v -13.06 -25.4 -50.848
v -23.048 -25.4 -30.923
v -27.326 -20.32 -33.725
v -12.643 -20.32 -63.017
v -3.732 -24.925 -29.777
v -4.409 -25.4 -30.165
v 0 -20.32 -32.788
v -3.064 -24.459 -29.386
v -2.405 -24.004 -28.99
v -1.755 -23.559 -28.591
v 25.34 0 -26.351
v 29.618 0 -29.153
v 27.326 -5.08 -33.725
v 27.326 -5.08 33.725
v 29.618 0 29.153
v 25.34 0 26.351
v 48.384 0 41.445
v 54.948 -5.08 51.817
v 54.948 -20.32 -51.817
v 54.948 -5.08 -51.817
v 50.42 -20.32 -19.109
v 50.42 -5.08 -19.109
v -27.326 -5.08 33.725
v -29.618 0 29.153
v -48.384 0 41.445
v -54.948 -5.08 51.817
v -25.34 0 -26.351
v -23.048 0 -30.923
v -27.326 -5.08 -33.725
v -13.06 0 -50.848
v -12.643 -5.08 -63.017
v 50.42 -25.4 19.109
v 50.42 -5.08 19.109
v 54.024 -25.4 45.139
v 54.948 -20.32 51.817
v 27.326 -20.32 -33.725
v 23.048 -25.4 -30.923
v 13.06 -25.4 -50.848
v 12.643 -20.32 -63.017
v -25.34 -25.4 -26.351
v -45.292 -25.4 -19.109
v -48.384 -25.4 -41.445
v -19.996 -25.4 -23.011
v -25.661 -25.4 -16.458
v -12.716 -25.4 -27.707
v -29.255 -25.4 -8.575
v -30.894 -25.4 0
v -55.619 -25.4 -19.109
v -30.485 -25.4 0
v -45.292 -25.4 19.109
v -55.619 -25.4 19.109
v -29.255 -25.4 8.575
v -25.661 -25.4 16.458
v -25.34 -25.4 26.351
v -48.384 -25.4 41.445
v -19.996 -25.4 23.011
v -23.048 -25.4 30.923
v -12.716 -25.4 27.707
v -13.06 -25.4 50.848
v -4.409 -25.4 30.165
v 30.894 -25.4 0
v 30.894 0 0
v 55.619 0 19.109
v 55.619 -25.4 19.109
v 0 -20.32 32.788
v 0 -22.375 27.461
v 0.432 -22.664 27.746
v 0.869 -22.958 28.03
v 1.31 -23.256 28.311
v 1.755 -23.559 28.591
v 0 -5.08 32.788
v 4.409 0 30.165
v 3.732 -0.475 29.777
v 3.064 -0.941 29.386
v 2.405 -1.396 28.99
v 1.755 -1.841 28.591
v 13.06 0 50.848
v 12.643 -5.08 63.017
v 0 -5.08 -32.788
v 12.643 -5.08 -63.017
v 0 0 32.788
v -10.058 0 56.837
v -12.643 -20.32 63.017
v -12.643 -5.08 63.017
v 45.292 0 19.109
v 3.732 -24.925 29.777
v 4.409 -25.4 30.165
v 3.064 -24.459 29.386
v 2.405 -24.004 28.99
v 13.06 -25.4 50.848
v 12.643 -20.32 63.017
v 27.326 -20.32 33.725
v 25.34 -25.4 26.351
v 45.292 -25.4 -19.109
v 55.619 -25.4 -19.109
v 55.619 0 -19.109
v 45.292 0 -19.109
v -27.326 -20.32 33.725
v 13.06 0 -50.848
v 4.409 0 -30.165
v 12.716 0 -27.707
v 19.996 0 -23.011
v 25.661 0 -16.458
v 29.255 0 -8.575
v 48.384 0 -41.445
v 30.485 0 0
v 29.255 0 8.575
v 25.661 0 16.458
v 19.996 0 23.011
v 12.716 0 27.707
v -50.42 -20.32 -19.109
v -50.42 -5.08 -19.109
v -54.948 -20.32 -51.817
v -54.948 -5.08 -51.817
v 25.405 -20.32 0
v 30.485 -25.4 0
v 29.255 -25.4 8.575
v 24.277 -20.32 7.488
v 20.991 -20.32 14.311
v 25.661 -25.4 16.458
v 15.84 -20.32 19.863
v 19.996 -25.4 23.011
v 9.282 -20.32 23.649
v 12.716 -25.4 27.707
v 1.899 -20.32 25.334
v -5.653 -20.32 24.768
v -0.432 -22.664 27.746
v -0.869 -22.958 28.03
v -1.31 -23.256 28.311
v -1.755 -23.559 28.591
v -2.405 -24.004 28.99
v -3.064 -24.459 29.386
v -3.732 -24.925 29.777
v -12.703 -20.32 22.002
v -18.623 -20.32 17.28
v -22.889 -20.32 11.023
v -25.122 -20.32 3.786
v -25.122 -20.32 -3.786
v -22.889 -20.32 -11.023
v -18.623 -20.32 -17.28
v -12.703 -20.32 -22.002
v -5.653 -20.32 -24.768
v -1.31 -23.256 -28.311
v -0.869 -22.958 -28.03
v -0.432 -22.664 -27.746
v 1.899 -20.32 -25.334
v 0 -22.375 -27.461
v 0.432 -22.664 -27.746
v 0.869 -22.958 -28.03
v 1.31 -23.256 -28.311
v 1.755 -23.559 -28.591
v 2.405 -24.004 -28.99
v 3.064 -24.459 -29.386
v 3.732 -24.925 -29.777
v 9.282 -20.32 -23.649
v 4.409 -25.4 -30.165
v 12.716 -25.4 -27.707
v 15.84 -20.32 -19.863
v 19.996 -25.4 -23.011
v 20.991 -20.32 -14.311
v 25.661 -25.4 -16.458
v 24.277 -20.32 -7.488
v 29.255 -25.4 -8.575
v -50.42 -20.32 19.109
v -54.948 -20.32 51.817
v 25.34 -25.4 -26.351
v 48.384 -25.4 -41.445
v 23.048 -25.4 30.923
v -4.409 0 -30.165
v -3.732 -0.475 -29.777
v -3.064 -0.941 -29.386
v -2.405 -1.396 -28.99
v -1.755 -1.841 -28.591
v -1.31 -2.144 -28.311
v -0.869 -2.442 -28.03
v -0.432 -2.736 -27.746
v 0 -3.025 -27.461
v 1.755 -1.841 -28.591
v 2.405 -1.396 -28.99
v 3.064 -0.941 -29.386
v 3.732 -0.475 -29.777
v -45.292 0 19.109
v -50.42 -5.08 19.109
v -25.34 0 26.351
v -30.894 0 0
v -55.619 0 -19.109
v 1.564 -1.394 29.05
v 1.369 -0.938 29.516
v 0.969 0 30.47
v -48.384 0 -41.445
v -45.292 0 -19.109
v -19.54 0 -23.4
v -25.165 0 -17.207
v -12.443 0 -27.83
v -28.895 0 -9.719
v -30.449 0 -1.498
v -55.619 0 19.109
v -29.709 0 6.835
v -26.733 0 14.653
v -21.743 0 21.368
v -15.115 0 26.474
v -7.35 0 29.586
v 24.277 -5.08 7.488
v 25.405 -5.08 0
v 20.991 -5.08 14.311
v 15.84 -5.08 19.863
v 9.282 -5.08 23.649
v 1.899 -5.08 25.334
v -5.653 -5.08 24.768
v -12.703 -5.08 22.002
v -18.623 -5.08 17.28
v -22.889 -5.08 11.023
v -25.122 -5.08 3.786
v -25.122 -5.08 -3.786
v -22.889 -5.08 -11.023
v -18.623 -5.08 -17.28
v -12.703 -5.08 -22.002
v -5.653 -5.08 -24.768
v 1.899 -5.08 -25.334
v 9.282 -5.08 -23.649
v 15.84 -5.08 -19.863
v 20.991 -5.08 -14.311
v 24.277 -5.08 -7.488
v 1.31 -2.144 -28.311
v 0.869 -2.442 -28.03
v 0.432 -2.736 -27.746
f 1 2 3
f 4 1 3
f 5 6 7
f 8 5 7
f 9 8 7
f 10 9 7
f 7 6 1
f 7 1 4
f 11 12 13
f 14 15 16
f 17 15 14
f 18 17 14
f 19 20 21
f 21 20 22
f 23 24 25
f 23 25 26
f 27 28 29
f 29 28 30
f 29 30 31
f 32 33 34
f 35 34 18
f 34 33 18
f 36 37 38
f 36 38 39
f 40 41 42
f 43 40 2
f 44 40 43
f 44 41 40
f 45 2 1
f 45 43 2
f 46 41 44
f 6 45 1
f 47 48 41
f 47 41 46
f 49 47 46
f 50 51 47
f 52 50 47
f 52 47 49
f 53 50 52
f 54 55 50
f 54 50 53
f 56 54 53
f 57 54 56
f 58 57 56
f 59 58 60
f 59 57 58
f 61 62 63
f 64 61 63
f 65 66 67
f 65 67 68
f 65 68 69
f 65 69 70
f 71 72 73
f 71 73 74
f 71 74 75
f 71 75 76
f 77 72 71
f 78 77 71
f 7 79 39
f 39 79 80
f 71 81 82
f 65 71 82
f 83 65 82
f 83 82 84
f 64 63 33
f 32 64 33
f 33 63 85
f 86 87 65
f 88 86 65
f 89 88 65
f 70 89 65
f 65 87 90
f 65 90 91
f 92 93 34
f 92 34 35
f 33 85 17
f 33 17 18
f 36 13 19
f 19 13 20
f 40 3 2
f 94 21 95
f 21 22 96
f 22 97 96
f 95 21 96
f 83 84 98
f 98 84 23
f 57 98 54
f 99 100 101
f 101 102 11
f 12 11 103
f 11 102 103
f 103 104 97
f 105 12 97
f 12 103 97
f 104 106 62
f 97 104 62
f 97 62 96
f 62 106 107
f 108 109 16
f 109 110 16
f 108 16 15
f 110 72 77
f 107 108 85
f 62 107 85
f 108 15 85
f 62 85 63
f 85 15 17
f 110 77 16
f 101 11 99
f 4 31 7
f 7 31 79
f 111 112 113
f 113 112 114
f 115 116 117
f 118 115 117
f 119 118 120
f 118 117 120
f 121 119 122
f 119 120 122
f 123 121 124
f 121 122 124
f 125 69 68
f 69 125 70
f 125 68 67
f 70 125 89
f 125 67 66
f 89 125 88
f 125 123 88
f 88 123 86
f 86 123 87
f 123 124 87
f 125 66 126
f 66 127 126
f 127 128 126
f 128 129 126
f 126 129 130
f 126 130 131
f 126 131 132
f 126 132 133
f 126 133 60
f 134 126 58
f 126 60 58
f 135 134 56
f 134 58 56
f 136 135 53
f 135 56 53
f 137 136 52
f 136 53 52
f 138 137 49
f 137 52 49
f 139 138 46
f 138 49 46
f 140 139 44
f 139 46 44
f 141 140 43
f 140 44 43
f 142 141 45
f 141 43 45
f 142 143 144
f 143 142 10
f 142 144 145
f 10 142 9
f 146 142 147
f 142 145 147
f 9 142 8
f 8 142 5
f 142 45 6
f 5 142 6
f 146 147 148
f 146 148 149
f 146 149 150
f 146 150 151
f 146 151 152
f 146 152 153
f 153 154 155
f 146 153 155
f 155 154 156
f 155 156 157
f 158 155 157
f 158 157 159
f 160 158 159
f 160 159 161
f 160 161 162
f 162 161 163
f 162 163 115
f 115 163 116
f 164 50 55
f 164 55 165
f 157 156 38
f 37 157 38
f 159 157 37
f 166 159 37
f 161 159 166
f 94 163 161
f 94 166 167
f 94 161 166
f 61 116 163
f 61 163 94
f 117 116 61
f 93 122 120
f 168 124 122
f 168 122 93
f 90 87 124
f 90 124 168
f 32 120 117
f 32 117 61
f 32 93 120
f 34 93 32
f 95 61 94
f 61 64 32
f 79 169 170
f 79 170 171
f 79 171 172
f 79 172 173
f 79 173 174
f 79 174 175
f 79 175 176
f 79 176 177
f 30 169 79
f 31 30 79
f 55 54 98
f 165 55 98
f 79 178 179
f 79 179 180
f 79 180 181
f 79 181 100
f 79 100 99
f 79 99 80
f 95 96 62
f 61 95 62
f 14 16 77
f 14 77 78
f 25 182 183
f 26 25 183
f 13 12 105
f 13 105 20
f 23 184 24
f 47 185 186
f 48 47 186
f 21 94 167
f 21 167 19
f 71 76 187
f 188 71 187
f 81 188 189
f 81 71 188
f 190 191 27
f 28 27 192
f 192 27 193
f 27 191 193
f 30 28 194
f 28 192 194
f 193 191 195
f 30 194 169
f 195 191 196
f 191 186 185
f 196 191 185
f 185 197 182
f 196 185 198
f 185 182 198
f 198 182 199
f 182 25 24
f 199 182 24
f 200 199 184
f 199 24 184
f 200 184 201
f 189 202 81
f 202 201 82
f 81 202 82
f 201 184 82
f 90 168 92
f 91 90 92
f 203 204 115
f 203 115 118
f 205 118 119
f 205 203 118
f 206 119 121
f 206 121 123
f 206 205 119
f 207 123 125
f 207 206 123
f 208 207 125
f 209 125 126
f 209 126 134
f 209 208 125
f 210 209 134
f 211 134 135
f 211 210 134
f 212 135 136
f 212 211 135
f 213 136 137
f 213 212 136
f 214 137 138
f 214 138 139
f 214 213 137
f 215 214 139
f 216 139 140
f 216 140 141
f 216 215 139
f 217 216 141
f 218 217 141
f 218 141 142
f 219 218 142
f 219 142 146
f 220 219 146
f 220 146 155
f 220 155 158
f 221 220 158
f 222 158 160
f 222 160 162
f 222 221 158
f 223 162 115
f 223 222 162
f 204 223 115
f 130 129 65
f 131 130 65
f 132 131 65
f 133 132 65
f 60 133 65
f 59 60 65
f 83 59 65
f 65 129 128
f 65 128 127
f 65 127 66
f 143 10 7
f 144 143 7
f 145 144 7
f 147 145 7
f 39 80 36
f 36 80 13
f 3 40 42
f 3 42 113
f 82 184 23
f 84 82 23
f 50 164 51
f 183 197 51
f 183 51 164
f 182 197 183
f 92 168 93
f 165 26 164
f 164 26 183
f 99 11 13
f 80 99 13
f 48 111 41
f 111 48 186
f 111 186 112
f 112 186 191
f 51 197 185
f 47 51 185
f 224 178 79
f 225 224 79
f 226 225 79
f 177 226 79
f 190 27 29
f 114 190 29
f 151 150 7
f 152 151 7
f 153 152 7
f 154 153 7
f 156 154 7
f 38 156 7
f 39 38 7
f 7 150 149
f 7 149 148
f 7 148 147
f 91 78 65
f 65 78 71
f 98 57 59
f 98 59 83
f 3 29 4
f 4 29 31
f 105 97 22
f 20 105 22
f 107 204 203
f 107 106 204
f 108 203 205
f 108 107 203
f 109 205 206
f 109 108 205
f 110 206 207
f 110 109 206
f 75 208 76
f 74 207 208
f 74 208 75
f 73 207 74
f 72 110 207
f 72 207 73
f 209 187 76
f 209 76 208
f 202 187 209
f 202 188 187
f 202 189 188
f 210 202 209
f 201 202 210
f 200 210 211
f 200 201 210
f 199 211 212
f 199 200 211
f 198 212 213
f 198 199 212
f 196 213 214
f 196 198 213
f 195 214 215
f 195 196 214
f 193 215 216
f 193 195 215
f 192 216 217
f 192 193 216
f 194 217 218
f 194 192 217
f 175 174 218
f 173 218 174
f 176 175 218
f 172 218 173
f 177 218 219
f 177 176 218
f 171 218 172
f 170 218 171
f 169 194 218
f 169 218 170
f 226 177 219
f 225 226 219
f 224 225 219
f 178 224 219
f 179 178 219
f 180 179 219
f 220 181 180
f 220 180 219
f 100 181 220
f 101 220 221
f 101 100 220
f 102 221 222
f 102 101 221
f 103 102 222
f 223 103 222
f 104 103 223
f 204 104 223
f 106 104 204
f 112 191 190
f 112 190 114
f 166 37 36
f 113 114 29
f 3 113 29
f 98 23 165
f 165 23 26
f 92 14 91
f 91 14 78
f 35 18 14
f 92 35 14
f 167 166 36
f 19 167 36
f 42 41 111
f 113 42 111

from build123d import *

# Parameters (mm, degrees)
F0_R          = 25.4053922475
F1_DEPTH      = 25.4
F2_SIZE       = 5.08
F3_T4_DEPTH   = 58.8942991577
F3_T9_DEPTH   = 59.1482991577
F3_T14_DEPTH  = 59.1482991577
F3_T19_DEPTH  = 59.1482991577
F3_T24_DEPTH  = 59.1482991577
F3_T29_DEPTH  = 58.8942991577
F3_T34_DEPTH  = 58.8942991577
F3_T39_DEPTH  = 58.8942991577
F3_T44_DEPTH  = 58.8942991577
F3_T49_DEPTH  = 59.1482991577
F3_T54_DEPTH  = 59.1482991577
F3_T59_DEPTH  = 58.8942991577
F3_T64_DEPTH  = 58.8942991577
F3_T69_DEPTH  = 59.1482991577
F3_T74_DEPTH  = 59.1482991577
F3_T79_DEPTH  = 59.1482991577
F3_T84_DEPTH  = 59.1482991577
F3_T89_DEPTH  = 58.8942991577
F3_T94_DEPTH  = 58.8942991577
F3_T99_DEPTH  = 58.8942991577
F3_T104_DEPTH = 59.1482991577
F3_T109_DEPTH = 59.1482991577
F3_T114_DEPTH = 59.1482991577
F3_T119_DEPTH = 58.8942991577
F3_T124_DEPTH = 59.1482991577
F3_T129_DEPTH = 59.1482991577
F3_T134_DEPTH = 58.8942991577
F3_T139_DEPTH = 58.8942991577
F3_T144_DEPTH = 58.8942991577
F3_T149_DEPTH = 58.8942991577


# Not quite as in the source:
# - a fillet or chamfer that OpenCascade refuses, or shapes differently, is made with other operations: its cross-section is extruded or revolved along the edge and cut away or added


with BuildPart() as f1:
    # F0 (on Front) → F1 (new body)
    with BuildSketch(Plane.XZ):
        Polygon((-55.6186027825, 19.1091839224), (-30.8941560641, 0), (-50.4200380058, 19.1091839224), align=None)
        Polygon((-54.9483810148, 51.8172029635), (-50.4200380058, 19.1091839224), (-27.3260947604, 33.7249476569), align=None)
        Polygon((-12.64267964, 63.0167225502), (-27.3260947604, 33.7249476569), (0, 32.7880373733), align=None)
        Polygon((12.64267964, 63.0167225502), (0, 32.7880373733), (27.3260947604, 33.7249476569), align=None)
        Polygon((54.9483810148, 51.8172029635), (27.3260947604, 33.7249476569), (50.4200380058, 19.1091839224), align=None)
        Polygon((55.6186027825, 19.1091839224), (50.4200380058, 19.1091839224), (30.8941560641, 0), align=None)
        Polygon((0, -32.7880373733), (-27.3260947604, -33.7249476569), (-12.64267964, -63.0167225502), align=None)
        Polygon((-27.3260947604, -33.7249476569), (-50.4200380058, -19.1091839224), (-54.9483810148, -51.8172029635), align=None)
        Polygon((-50.4200380058, -19.1091839224), (-30.8941560641, 0), (-55.6186027825, -19.1091839224), align=None)
        Polygon((27.3260947604, -33.7249476569), (0, -32.7880373733), (12.64267964, -63.0167225502), align=None)
        Polygon((50.4200380058, -19.1091839224), (27.3260947604, -33.7249476569), (54.9483810148, -51.8172029635), align=None)
        Polygon((30.8941560641, 0), (50.4200380058, -19.1091839224), (55.6186027825, -19.1091839224), align=None)
        Polygon((-50.4200380058, 19.1091839224), (-30.8941560641, 0), (-50.4200380058, -19.1091839224), (-27.3260947604, -33.7249476569), (0, -32.7880373733), (27.3260947604, -33.7249476569), (50.4200380058, -19.1091839224), (30.8941560641, 0), (50.4200380058, 19.1091839224), (27.3260947604, 33.7249476569), (0, 32.7880373733), (-27.3260947604, 33.7249476569), align=None)
        Circle(F0_R, mode=Mode.SUBTRACT)
    extrude(amount=F1_DEPTH)

    # F2
    f2_edges = [f1.edges().sort_by_distance(p)[0] for p in [
        (-25.405392, 0, 0),
        (-25.405392, -25.4, 0),
    ]]
    chamfer(f2_edges, length=F2_SIZE)

    # F3: chamfer of 5.08 on 30 edges, made by hand


with BuildPart() as f3_tool2:
    # F3_s3 → F3_t4 (new body)
    with BuildSketch(Plane(origin=(28.5608965027, 0, 56.9758018995), x_dir=(0, 1, 0), z_dir=(-0.4481296197, 0, -0.8939685922))):
        Polygon((0, -34.4618184336), (-5.08, -39.5418184336), (0, -39.5418184336), align=None)
    extrude(amount=F3_T4_DEPTH)

    split(bisect_by=Plane(origin=(2.2353786575, 4.079767946, 3.4128563917), x_dir=(-0.8769857612, 0.4805163626, 0), z_dir=(0.3874365964, 0.7071067812, 0.5915174416)), keep=Keep.TOP)


with BuildPart() as f1_1:
    add(f1.part)

    # F3_t1: cut F3_tool2
    add(f3_tool2.part, mode=Mode.SUBTRACT)


with BuildPart() as f3_tool7:
    # F3_s8 → F3_t9 (new body)
    with BuildSketch(Plane(origin=(-23.6516969458, 0, 15.4915684979), x_dir=(0, 1, 0), z_dir=(-0.8365319883, 0, 0.5479180892))):
        Polygon((0, -8.159535892), (-5.08, -13.239535892), (0, -13.239535892), align=None)
    extrude(amount=F3_T9_DEPTH)

    split(bisect_by=Plane(origin=(-15.4038916556, 17.2309092168, 7.7216807951), x_dir=(-0.7455258584, -0.6664767021, 0), z_dir=(-0.6321312537, 0.7071067812, 0.316875493)), keep=Keep.TOP)


with BuildPart() as f1_2:
    add(f1_1.part)

    # F3_t6: cut F3_tool7
    add(f3_tool7.part, mode=Mode.SUBTRACT)


with BuildPart() as f3_tool12:
    # F3_s13 → F3_t14 (new body)
    with BuildSketch(Plane(origin=(-9.8640749157, 0, 71.247771982), x_dir=(0, 1, 0), z_dir=(0.1371394006, 0, -0.9905517578))):
        Polygon((0, -42.2430352429), (-5.08, -47.3230352429), (0, -47.3230352429), align=None)
    extrude(amount=F3_T14_DEPTH)

    split(bisect_by=Plane.XY.offset(19.1091839224), keep=Keep.TOP)


with BuildPart() as f1_3:
    add(f1_2.part)

    # F3_t11: cut F3_tool12
    add(f3_tool12.part, mode=Mode.SUBTRACT)


with BuildPart() as f3_tool17:
    # F3_s18 → F3_t19 (new body)
    with BuildSketch(Plane(origin=(-1.7525126205, 0, -12.658320283), x_dir=(0, 1, 0), z_dir=(-0.1371394006, 0, -0.9905517578))):
        Polygon((0, -42.2430352429), (-5.08, -47.3230352429), (0, -47.3230352429), align=None)
    extrude(amount=F3_T19_DEPTH)

    split(bisect_by=Plane.XY.offset(-19.1091839224), keep=Keep.BOTTOM)


with BuildPart() as f1_4:
    add(f1_3.part)

    # F3_t16: cut F3_tool17
    add(f3_tool17.part, mode=Mode.SUBTRACT)


with BuildPart() as f3_tool22:
    # F3_s23 → F3_t24 (new body)
    with BuildSketch(Plane(origin=(-73.1311412461, 0, -47.8999915541), x_dir=(0, 1, 0), z_dir=(0.8365319883, 0, 0.5479180892))):
        Polygon((0, -8.159535892), (-5.08, -13.239535892), (0, -13.239535892), align=None)
    extrude(amount=F3_T24_DEPTH)

    split(bisect_by=Plane(origin=(-15.4038916556, 17.2309092168, -7.7216807951), x_dir=(-0.7455258584, -0.6664767021, 0), z_dir=(-0.6321312537, 0.7071067812, -0.316875493)), keep=Keep.TOP)


with BuildPart() as f1_5:
    add(f1_4.part)

    # F3_t21: cut F3_tool22
    add(f3_tool22.part, mode=Mode.SUBTRACT)


with BuildPart() as f3_tool27:
    # F3_s28 → F3_t29 (new body)
    with BuildSketch(Plane(origin=(2.1686166163, 0, -4.3261481905), x_dir=(0, 1, 0), z_dir=(0.4481296197, 0, -0.8939685922))):
        Polygon((0, -34.4618184336), (-5.08, -39.5418184336), (0, -39.5418184336), align=None)
    extrude(amount=F3_T29_DEPTH)

    split(bisect_by=Plane(origin=(2.2353786575, 4.079767946, -3.4128563917), x_dir=(-0.8769857612, 0.4805163626, 0), z_dir=(0.3874365964, 0.7071067812, -0.5915174416)), keep=Keep.TOP)


with BuildPart() as f1_6:
    add(f1_5.part)

    # F3_t26: cut F3_tool27
    add(f3_tool27.part, mode=Mode.SUBTRACT)


with BuildPart() as f3_tool32:
    # F3_s33 → F3_t34 (new body)
    with BuildSketch(Plane(origin=(-29.3549569097, 0, -70.1877905691), x_dir=(0, 1, 0), z_dir=(0.3858475139, 0, 0.9225625703))):
        Polygon((0, -7.5711827057), (-5.08, -12.6511827057), (0, -12.6511827057), align=None)
    extrude(amount=F3_T34_DEPTH)

    split(bisect_by=Plane(origin=(-3.4924448884, 3.7855913528, -1.4606610121), x_dir=(-0.7349918349, -0.6780759564, 0), z_dir=(-0.6523502495, 0.7071067812, -0.2728353936)), keep=Keep.TOP)


with BuildPart() as f1_7:
    add(f1_6.part)

    # F3_t31: cut F3_tool32
    add(f3_tool32.part, mode=Mode.SUBTRACT)


with BuildPart() as f3_tool37:
    # F3_s38 → F3_t39 (new body)
    with BuildSketch(Plane(origin=(6.6307379976, 0, -15.854114565), x_dir=(0, 1, 0), z_dir=(0.3858475139, 0, -0.9225625703))):
        Polygon((0, -7.5711827057), (-5.08, -12.6511827057), (0, -12.6511827057), align=None)
    extrude(amount=F3_T39_DEPTH)

    split(bisect_by=Plane(origin=(3.4924448884, 3.7855913528, -1.4606610121), x_dir=(-0.7349918349, 0.6780759564, 0), z_dir=(0.6523502495, 0.7071067812, -0.2728353936)), keep=Keep.TOP)


with BuildPart() as f1_8:
    add(f1_7.part)

    # F3_t36: cut F3_tool37
    add(f3_tool37.part, mode=Mode.SUBTRACT)


with BuildPart() as f3_tool42:
    # F3_s43 → F3_t44 (new body)
    with BuildSketch(Plane(origin=(-28.5608965027, 0, -56.9758018995), x_dir=(0, 1, 0), z_dir=(0.4481296197, 0, 0.8939685922))):
        Polygon((0, -34.4618184336), (-5.08, -39.5418184336), (0, -39.5418184336), align=None)
    extrude(amount=F3_T44_DEPTH)

    split(bisect_by=Plane(origin=(-2.2353786575, 4.079767946, -3.4128563917), x_dir=(-0.8769857612, -0.4805163626, 0), z_dir=(-0.3874365964, 0.7071067812, -0.5915174416)), keep=Keep.TOP)


with BuildPart() as f1_9:
    add(f1_8.part)

    # F3_t41: cut F3_tool42
    add(f3_tool42.part, mode=Mode.SUBTRACT)


with BuildPart() as f3_tool47:
    # F3_s48 → F3_t49 (new body)
    with BuildSketch(Plane(origin=(23.6516969458, 0, -15.4915684979), x_dir=(0, 1, 0), z_dir=(0.8365319883, 0, -0.5479180892))):
        Polygon((0, -8.159535892), (-5.08, -13.239535892), (0, -13.239535892), align=None)
    extrude(amount=F3_T49_DEPTH)

    split(bisect_by=Plane(origin=(15.4038916556, 17.2309092168, -7.7216807951), x_dir=(-0.7455258584, 0.6664767021, 0), z_dir=(0.6321312537, 0.7071067812, -0.316875493)), keep=Keep.TOP)


with BuildPart() as f1_10:
    add(f1_9.part)

    # F3_t46: cut F3_tool47
    add(f3_tool47.part, mode=Mode.SUBTRACT)


with BuildPart() as f3_tool52:
    # F3_s53 → F3_t54 (new body)
    with BuildSketch(Plane(origin=(9.8640749157, 0, -71.247771982), x_dir=(0, 1, 0), z_dir=(-0.1371394006, 0, 0.9905517578))):
        Polygon((0, -42.2430352429), (-5.08, -47.3230352429), (0, -47.3230352429), align=None)
    extrude(amount=F3_T54_DEPTH)

    split(bisect_by=Plane.XY.offset(-19.1091839224), keep=Keep.BOTTOM)


with BuildPart() as f1_11:
    add(f1_10.part)

    # F3_t51: cut F3_tool52
    add(f3_tool52.part, mode=Mode.SUBTRACT)


with BuildPart() as f3_tool57:
    # F3_s58 → F3_t59 (new body)
    with BuildSketch(Plane(origin=(29.3549569097, 0, 70.1877905691), x_dir=(0, 1, 0), z_dir=(-0.3858475139, 0, -0.9225625703))):
        Polygon((0, -7.5711827057), (-5.08, -12.6511827057), (0, -12.6511827057), align=None)
    extrude(amount=F3_T59_DEPTH)

    split(bisect_by=Plane(origin=(11.6715076337, 0, 4.8814273947), x_dir=(0, 1, 0), z_dir=(0.9225625703, 0, 0.3858475139)), keep=Keep.TOP)


with BuildPart() as f1_12:
    add(f1_11.part)

    # F3_t56: cut F3_tool57
    add(f3_tool57.part, mode=Mode.SUBTRACT)


with BuildPart() as f3_tool62:
    # F3_s63 → F3_t64 (new body)
    with BuildSketch(Plane(origin=(-2.1686166163, 0, 4.3261481905), x_dir=(0, 1, 0), z_dir=(-0.4481296197, 0, 0.8939685922))):
        Polygon((0, -34.4618184336), (-5.08, -39.5418184336), (0, -39.5418184336), align=None)
    extrude(amount=F3_T64_DEPTH)

    split(bisect_by=Plane(origin=(-2.2353786575, 4.079767946, 3.4128563917), x_dir=(-0.8769857612, -0.4805163626, 0), z_dir=(-0.3874365964, 0.7071067812, 0.5915174416)), keep=Keep.TOP)


with BuildPart() as f1_13:
    add(f1_12.part)

    # F3_t61: cut F3_tool62
    add(f3_tool62.part, mode=Mode.SUBTRACT)


with BuildPart() as f3_tool67:
    # F3_s68 → F3_t69 (new body)
    with BuildSketch(Plane(origin=(73.1311412461, 0, 47.8999915541), x_dir=(0, 1, 0), z_dir=(-0.8365319883, 0, -0.5479180892))):
        Polygon((0, -8.159535892), (-5.08, -13.239535892), (0, -13.239535892), align=None)
    extrude(amount=F3_T69_DEPTH)

    split(bisect_by=Plane(origin=(15.4038916556, 17.2309092168, 7.7216807951), x_dir=(-0.7455258584, 0.6664767021, 0), z_dir=(0.6321312537, 0.7071067812, 0.316875493)), keep=Keep.TOP)


with BuildPart() as f1_14:
    add(f1_13.part)

    # F3_t66: cut F3_tool67
    add(f3_tool67.part, mode=Mode.SUBTRACT)


with BuildPart() as f3_tool72:
    # F3_s73 → F3_t74 (new body)
    with BuildSketch(Plane(origin=(1.7525126205, 0, 12.658320283), x_dir=(0, 1, 0), z_dir=(0.1371394006, 0, 0.9905517578))):
        Polygon((0, -42.2430352429), (-5.08, -47.3230352429), (0, -47.3230352429), align=None)
    extrude(amount=F3_T74_DEPTH)

    split(bisect_by=Plane.XY.offset(19.1091839224), keep=Keep.TOP)


with BuildPart() as f1_15:
    add(f1_14.part)

    # F3_t71: cut F3_tool72
    add(f3_tool72.part, mode=Mode.SUBTRACT)


with BuildPart() as f3_tool77:
    # F3_s78 → F3_t79 (new body)
    with BuildSketch(Plane(origin=(-9.8640749157, 0, 71.247771982), x_dir=(0, 1, 0), z_dir=(0.1371394006, 0, -0.9905517578))):
        Polygon((-25.4, -42.2430352429), (-20.32, -47.3230352429), (-25.4, -47.3230352429), align=None)
    extrude(amount=F3_T79_DEPTH)

    split(bisect_by=Plane.XY.offset(19.1091839224), keep=Keep.TOP)


with BuildPart() as f1_16:
    add(f1_15.part)

    # F3_t76: cut F3_tool77
    add(f3_tool77.part, mode=Mode.SUBTRACT)


with BuildPart() as f3_tool82:
    # F3_s83 → F3_t84 (new body)
    with BuildSketch(Plane(origin=(-23.6516969458, 0, 15.4915684979), x_dir=(0, 1, 0), z_dir=(-0.8365319883, 0, 0.5479180892))):
        Polygon((-25.4, -8.159535892), (-20.32, -13.239535892), (-25.4, -13.239535892), align=None)
    extrude(amount=F3_T84_DEPTH)

    split(bisect_by=Plane(origin=(-26.757292777, -29.9309092168, 13.4129269658), x_dir=(0.7455258584, -0.6664767021, 0), z_dir=(-0.6321312537, -0.7071067812, 0.316875493)), keep=Keep.TOP)


with BuildPart() as f1_17:
    add(f1_16.part)

    # F3_t81: cut F3_tool82
    add(f3_tool82.part, mode=Mode.SUBTRACT)


with BuildPart() as f3_tool87:
    # F3_s88 → F3_t89 (new body)
    with BuildSketch(Plane(origin=(28.5608965027, 0, 56.9758018995), x_dir=(0, 1, 0), z_dir=(-0.4481296197, 0, -0.8939685922))):
        Polygon((-25.4, -34.4618184336), (-20.32, -39.5418184336), (-25.4, -39.5418184336), align=None)
    extrude(amount=F3_T89_DEPTH)

    split(bisect_by=Plane(origin=(9.1939383908, -16.779767946, 14.0368126434), x_dir=(0.8769857612, 0.4805163626, 0), z_dir=(0.3874365964, -0.7071067812, 0.5915174416)), keep=Keep.TOP)


with BuildPart() as f1_18:
    add(f1_17.part)

    # F3_t86: cut F3_tool87
    add(f3_tool87.part, mode=Mode.SUBTRACT)


with BuildPart() as f3_tool92:
    # F3_s93 → F3_t94 (new body)
    with BuildSketch(Plane(origin=(-6.6307379976, 0, 15.854114565), x_dir=(0, 1, 0), z_dir=(-0.3858475139, 0, 0.9225625703))):
        Polygon((-25.4, -7.5711827057), (-20.32, -12.6511827057), (-25.4, -12.6511827057), align=None)
    extrude(amount=F3_T94_DEPTH)

    split(bisect_by=Plane(origin=(-15.2089895306, -16.4855913528, 6.3609244384), x_dir=(0.7349918349, -0.6780759564, 0), z_dir=(-0.6523502495, -0.7071067812, 0.2728353936)), keep=Keep.TOP)


with BuildPart() as f1_19:
    add(f1_18.part)

    # F3_t91: cut F3_tool92
    add(f3_tool92.part, mode=Mode.SUBTRACT)


with BuildPart() as f3_tool97:
    # F3_s98 → F3_t99 (new body)
    with BuildSketch(Plane(origin=(29.3549569097, 0, 70.1877905691), x_dir=(0, 1, 0), z_dir=(-0.3858475139, 0, -0.9225625703))):
        Polygon((-25.4, -7.5711827057), (-20.32, -12.6511827057), (-25.4, -12.6511827057), align=None)
    extrude(amount=F3_T99_DEPTH)

    split(bisect_by=Plane(origin=(15.2089895306, -16.4855913528, 6.3609244384), x_dir=(0.7349918349, 0.6780759564, 0), z_dir=(0.6523502495, -0.7071067812, 0.2728353936)), keep=Keep.TOP)


with BuildPart() as f1_20:
    add(f1_19.part)

    # F3_t96: cut F3_tool97
    add(f3_tool97.part, mode=Mode.SUBTRACT)


with BuildPart() as f3_tool102:
    # F3_s103 → F3_t104 (new body)
    with BuildSketch(Plane(origin=(73.1311412461, 0, 47.8999915541), x_dir=(0, 1, 0), z_dir=(-0.8365319883, 0, -0.5479180892))):
        Polygon((-25.4, -8.159535892), (-20.32, -13.239535892), (-25.4, -13.239535892), align=None)
    extrude(amount=F3_T104_DEPTH)

    split(bisect_by=Plane(origin=(26.757292777, -29.9309092168, 13.4129269658), x_dir=(0.7455258584, 0.6664767021, 0), z_dir=(0.6321312537, -0.7071067812, 0.316875493)), keep=Keep.TOP)


with BuildPart() as f1_21:
    add(f1_20.part)

    # F3_t101: cut F3_tool102
    add(f3_tool102.part, mode=Mode.SUBTRACT)


with BuildPart() as f3_tool107:
    # F3_s108 → F3_t109 (new body)
    with BuildSketch(Plane(origin=(9.8640749157, 0, -71.247771982), x_dir=(0, 1, 0), z_dir=(-0.1371394006, 0, 0.9905517578))):
        Polygon((-25.4, -42.2430352429), (-20.32, -47.3230352429), (-25.4, -47.3230352429), align=None)
    extrude(amount=F3_T109_DEPTH)

    split(bisect_by=Plane.XY.offset(-19.1091839224), keep=Keep.BOTTOM)


with BuildPart() as f1_22:
    add(f1_21.part)

    # F3_t106: cut F3_tool107
    add(f3_tool107.part, mode=Mode.SUBTRACT)


with BuildPart() as f3_tool112:
    # F3_s113 → F3_t114 (new body)
    with BuildSketch(Plane(origin=(23.6516969458, 0, -15.4915684979), x_dir=(0, 1, 0), z_dir=(0.8365319883, 0, -0.5479180892))):
        Polygon((-25.4, -8.159535892), (-20.32, -13.239535892), (-25.4, -13.239535892), align=None)
    extrude(amount=F3_T114_DEPTH)

    split(bisect_by=Plane(origin=(26.757292777, -29.9309092168, -13.4129269658), x_dir=(0.7455258584, 0.6664767021, 0), z_dir=(0.6321312537, -0.7071067812, -0.316875493)), keep=Keep.TOP)


with BuildPart() as f1_23:
    add(f1_22.part)

    # F3_t111: cut F3_tool112
    add(f3_tool112.part, mode=Mode.SUBTRACT)


with BuildPart() as f3_tool117:
    # F3_s118 → F3_t119 (new body)
    with BuildSketch(Plane(origin=(-2.1686166163, 0, 4.3261481905), x_dir=(0, 1, 0), z_dir=(-0.4481296197, 0, 0.8939685922))):
        Polygon((-25.4, -34.4618184336), (-20.32, -39.5418184336), (-25.4, -39.5418184336), align=None)
    extrude(amount=F3_T119_DEPTH)

    split(bisect_by=Plane(origin=(-9.1939383908, -16.779767946, 14.0368126434), x_dir=(0.8769857612, -0.4805163626, 0), z_dir=(-0.3874365964, -0.7071067812, 0.5915174416)), keep=Keep.TOP)


with BuildPart() as f1_24:
    add(f1_23.part)

    # F3_t116: cut F3_tool117
    add(f3_tool117.part, mode=Mode.SUBTRACT)


with BuildPart() as f3_tool122:
    # F3_s123 → F3_t124 (new body)
    with BuildSketch(Plane(origin=(-1.7525126205, 0, -12.658320283), x_dir=(0, 1, 0), z_dir=(-0.1371394006, 0, -0.9905517578))):
        Polygon((-25.4, -42.2430352429), (-20.32, -47.3230352429), (-25.4, -47.3230352429), align=None)
    extrude(amount=F3_T124_DEPTH)

    split(bisect_by=Plane.XY.offset(-19.1091839224), keep=Keep.BOTTOM)


with BuildPart() as f1_25:
    add(f1_24.part)

    # F3_t121: cut F3_tool122
    add(f3_tool122.part, mode=Mode.SUBTRACT)


with BuildPart() as f3_tool127:
    # F3_s128 → F3_t129 (new body)
    with BuildSketch(Plane(origin=(-73.1311412461, 0, -47.8999915541), x_dir=(0, 1, 0), z_dir=(0.8365319883, 0, 0.5479180892))):
        Polygon((-25.4, -8.159535892), (-20.32, -13.239535892), (-25.4, -13.239535892), align=None)
    extrude(amount=F3_T129_DEPTH)

    split(bisect_by=Plane(origin=(-26.757292777, -29.9309092168, -13.4129269658), x_dir=(0.7455258584, -0.6664767021, 0), z_dir=(-0.6321312537, -0.7071067812, -0.316875493)), keep=Keep.TOP)


with BuildPart() as f1_26:
    add(f1_25.part)

    # F3_t126: cut F3_tool127
    add(f3_tool127.part, mode=Mode.SUBTRACT)


with BuildPart() as f3_tool132:
    # F3_s133 → F3_t134 (new body)
    with BuildSketch(Plane(origin=(2.1686166163, 0, -4.3261481905), x_dir=(0, 1, 0), z_dir=(0.4481296197, 0, -0.8939685922))):
        Polygon((-25.4, -34.4618184336), (-20.32, -39.5418184336), (-25.4, -39.5418184336), align=None)
    extrude(amount=F3_T134_DEPTH)

    split(bisect_by=Plane(origin=(9.1939383908, -16.779767946, -14.0368126434), x_dir=(0.8769857612, 0.4805163626, 0), z_dir=(0.3874365964, -0.7071067812, -0.5915174416)), keep=Keep.TOP)


with BuildPart() as f1_27:
    add(f1_26.part)

    # F3_t131: cut F3_tool132
    add(f3_tool132.part, mode=Mode.SUBTRACT)


with BuildPart() as f3_tool137:
    # F3_s138 → F3_t139 (new body)
    with BuildSketch(Plane(origin=(6.6307379976, 0, -15.854114565), x_dir=(0, 1, 0), z_dir=(0.3858475139, 0, -0.9225625703))):
        Polygon((-25.4, -7.5711827057), (-20.32, -12.6511827057), (-25.4, -12.6511827057), align=None)
    extrude(amount=F3_T139_DEPTH)

    split(bisect_by=Plane(origin=(15.2089895306, -16.4855913528, -6.3609244384), x_dir=(0.7349918349, 0.6780759564, 0), z_dir=(0.6523502495, -0.7071067812, -0.2728353936)), keep=Keep.TOP)


with BuildPart() as f1_28:
    add(f1_27.part)

    # F3_t136: cut F3_tool137
    add(f3_tool137.part, mode=Mode.SUBTRACT)


with BuildPart() as f3_tool142:
    # F3_s143 → F3_t144 (new body)
    with BuildSketch(Plane(origin=(-28.5608965027, 0, -56.9758018995), x_dir=(0, 1, 0), z_dir=(0.4481296197, 0, 0.8939685922))):
        Polygon((-25.4, -34.4618184336), (-20.32, -39.5418184336), (-25.4, -39.5418184336), align=None)
    extrude(amount=F3_T144_DEPTH)

    split(bisect_by=Plane(origin=(-9.1939383908, -16.779767946, -14.0368126434), x_dir=(0.8769857612, -0.4805163626, 0), z_dir=(-0.3874365964, -0.7071067812, -0.5915174416)), keep=Keep.TOP)


with BuildPart() as f1_29:
    add(f1_28.part)

    # F3_t141: cut F3_tool142
    add(f3_tool142.part, mode=Mode.SUBTRACT)


with BuildPart() as f3_tool147:
    # F3_s148 → F3_t149 (new body)
    with BuildSketch(Plane(origin=(-29.3549569097, 0, -70.1877905691), x_dir=(0, 1, 0), z_dir=(0.3858475139, 0, 0.9225625703))):
        Polygon((-25.4, -7.5711827057), (-20.32, -12.6511827057), (-25.4, -12.6511827057), align=None)
    extrude(amount=F3_T149_DEPTH)

    split(bisect_by=Plane(origin=(-15.2089895306, -16.4855913528, -6.3609244384), x_dir=(0.7349918349, -0.6780759564, 0), z_dir=(-0.6523502495, -0.7071067812, -0.2728353936)), keep=Keep.TOP)


with BuildPart() as f1_30:
    add(f1_29.part)

    # F3_t146: cut F3_tool147
    add(f3_tool147.part, mode=Mode.SUBTRACT)


solid = f1_30.part
